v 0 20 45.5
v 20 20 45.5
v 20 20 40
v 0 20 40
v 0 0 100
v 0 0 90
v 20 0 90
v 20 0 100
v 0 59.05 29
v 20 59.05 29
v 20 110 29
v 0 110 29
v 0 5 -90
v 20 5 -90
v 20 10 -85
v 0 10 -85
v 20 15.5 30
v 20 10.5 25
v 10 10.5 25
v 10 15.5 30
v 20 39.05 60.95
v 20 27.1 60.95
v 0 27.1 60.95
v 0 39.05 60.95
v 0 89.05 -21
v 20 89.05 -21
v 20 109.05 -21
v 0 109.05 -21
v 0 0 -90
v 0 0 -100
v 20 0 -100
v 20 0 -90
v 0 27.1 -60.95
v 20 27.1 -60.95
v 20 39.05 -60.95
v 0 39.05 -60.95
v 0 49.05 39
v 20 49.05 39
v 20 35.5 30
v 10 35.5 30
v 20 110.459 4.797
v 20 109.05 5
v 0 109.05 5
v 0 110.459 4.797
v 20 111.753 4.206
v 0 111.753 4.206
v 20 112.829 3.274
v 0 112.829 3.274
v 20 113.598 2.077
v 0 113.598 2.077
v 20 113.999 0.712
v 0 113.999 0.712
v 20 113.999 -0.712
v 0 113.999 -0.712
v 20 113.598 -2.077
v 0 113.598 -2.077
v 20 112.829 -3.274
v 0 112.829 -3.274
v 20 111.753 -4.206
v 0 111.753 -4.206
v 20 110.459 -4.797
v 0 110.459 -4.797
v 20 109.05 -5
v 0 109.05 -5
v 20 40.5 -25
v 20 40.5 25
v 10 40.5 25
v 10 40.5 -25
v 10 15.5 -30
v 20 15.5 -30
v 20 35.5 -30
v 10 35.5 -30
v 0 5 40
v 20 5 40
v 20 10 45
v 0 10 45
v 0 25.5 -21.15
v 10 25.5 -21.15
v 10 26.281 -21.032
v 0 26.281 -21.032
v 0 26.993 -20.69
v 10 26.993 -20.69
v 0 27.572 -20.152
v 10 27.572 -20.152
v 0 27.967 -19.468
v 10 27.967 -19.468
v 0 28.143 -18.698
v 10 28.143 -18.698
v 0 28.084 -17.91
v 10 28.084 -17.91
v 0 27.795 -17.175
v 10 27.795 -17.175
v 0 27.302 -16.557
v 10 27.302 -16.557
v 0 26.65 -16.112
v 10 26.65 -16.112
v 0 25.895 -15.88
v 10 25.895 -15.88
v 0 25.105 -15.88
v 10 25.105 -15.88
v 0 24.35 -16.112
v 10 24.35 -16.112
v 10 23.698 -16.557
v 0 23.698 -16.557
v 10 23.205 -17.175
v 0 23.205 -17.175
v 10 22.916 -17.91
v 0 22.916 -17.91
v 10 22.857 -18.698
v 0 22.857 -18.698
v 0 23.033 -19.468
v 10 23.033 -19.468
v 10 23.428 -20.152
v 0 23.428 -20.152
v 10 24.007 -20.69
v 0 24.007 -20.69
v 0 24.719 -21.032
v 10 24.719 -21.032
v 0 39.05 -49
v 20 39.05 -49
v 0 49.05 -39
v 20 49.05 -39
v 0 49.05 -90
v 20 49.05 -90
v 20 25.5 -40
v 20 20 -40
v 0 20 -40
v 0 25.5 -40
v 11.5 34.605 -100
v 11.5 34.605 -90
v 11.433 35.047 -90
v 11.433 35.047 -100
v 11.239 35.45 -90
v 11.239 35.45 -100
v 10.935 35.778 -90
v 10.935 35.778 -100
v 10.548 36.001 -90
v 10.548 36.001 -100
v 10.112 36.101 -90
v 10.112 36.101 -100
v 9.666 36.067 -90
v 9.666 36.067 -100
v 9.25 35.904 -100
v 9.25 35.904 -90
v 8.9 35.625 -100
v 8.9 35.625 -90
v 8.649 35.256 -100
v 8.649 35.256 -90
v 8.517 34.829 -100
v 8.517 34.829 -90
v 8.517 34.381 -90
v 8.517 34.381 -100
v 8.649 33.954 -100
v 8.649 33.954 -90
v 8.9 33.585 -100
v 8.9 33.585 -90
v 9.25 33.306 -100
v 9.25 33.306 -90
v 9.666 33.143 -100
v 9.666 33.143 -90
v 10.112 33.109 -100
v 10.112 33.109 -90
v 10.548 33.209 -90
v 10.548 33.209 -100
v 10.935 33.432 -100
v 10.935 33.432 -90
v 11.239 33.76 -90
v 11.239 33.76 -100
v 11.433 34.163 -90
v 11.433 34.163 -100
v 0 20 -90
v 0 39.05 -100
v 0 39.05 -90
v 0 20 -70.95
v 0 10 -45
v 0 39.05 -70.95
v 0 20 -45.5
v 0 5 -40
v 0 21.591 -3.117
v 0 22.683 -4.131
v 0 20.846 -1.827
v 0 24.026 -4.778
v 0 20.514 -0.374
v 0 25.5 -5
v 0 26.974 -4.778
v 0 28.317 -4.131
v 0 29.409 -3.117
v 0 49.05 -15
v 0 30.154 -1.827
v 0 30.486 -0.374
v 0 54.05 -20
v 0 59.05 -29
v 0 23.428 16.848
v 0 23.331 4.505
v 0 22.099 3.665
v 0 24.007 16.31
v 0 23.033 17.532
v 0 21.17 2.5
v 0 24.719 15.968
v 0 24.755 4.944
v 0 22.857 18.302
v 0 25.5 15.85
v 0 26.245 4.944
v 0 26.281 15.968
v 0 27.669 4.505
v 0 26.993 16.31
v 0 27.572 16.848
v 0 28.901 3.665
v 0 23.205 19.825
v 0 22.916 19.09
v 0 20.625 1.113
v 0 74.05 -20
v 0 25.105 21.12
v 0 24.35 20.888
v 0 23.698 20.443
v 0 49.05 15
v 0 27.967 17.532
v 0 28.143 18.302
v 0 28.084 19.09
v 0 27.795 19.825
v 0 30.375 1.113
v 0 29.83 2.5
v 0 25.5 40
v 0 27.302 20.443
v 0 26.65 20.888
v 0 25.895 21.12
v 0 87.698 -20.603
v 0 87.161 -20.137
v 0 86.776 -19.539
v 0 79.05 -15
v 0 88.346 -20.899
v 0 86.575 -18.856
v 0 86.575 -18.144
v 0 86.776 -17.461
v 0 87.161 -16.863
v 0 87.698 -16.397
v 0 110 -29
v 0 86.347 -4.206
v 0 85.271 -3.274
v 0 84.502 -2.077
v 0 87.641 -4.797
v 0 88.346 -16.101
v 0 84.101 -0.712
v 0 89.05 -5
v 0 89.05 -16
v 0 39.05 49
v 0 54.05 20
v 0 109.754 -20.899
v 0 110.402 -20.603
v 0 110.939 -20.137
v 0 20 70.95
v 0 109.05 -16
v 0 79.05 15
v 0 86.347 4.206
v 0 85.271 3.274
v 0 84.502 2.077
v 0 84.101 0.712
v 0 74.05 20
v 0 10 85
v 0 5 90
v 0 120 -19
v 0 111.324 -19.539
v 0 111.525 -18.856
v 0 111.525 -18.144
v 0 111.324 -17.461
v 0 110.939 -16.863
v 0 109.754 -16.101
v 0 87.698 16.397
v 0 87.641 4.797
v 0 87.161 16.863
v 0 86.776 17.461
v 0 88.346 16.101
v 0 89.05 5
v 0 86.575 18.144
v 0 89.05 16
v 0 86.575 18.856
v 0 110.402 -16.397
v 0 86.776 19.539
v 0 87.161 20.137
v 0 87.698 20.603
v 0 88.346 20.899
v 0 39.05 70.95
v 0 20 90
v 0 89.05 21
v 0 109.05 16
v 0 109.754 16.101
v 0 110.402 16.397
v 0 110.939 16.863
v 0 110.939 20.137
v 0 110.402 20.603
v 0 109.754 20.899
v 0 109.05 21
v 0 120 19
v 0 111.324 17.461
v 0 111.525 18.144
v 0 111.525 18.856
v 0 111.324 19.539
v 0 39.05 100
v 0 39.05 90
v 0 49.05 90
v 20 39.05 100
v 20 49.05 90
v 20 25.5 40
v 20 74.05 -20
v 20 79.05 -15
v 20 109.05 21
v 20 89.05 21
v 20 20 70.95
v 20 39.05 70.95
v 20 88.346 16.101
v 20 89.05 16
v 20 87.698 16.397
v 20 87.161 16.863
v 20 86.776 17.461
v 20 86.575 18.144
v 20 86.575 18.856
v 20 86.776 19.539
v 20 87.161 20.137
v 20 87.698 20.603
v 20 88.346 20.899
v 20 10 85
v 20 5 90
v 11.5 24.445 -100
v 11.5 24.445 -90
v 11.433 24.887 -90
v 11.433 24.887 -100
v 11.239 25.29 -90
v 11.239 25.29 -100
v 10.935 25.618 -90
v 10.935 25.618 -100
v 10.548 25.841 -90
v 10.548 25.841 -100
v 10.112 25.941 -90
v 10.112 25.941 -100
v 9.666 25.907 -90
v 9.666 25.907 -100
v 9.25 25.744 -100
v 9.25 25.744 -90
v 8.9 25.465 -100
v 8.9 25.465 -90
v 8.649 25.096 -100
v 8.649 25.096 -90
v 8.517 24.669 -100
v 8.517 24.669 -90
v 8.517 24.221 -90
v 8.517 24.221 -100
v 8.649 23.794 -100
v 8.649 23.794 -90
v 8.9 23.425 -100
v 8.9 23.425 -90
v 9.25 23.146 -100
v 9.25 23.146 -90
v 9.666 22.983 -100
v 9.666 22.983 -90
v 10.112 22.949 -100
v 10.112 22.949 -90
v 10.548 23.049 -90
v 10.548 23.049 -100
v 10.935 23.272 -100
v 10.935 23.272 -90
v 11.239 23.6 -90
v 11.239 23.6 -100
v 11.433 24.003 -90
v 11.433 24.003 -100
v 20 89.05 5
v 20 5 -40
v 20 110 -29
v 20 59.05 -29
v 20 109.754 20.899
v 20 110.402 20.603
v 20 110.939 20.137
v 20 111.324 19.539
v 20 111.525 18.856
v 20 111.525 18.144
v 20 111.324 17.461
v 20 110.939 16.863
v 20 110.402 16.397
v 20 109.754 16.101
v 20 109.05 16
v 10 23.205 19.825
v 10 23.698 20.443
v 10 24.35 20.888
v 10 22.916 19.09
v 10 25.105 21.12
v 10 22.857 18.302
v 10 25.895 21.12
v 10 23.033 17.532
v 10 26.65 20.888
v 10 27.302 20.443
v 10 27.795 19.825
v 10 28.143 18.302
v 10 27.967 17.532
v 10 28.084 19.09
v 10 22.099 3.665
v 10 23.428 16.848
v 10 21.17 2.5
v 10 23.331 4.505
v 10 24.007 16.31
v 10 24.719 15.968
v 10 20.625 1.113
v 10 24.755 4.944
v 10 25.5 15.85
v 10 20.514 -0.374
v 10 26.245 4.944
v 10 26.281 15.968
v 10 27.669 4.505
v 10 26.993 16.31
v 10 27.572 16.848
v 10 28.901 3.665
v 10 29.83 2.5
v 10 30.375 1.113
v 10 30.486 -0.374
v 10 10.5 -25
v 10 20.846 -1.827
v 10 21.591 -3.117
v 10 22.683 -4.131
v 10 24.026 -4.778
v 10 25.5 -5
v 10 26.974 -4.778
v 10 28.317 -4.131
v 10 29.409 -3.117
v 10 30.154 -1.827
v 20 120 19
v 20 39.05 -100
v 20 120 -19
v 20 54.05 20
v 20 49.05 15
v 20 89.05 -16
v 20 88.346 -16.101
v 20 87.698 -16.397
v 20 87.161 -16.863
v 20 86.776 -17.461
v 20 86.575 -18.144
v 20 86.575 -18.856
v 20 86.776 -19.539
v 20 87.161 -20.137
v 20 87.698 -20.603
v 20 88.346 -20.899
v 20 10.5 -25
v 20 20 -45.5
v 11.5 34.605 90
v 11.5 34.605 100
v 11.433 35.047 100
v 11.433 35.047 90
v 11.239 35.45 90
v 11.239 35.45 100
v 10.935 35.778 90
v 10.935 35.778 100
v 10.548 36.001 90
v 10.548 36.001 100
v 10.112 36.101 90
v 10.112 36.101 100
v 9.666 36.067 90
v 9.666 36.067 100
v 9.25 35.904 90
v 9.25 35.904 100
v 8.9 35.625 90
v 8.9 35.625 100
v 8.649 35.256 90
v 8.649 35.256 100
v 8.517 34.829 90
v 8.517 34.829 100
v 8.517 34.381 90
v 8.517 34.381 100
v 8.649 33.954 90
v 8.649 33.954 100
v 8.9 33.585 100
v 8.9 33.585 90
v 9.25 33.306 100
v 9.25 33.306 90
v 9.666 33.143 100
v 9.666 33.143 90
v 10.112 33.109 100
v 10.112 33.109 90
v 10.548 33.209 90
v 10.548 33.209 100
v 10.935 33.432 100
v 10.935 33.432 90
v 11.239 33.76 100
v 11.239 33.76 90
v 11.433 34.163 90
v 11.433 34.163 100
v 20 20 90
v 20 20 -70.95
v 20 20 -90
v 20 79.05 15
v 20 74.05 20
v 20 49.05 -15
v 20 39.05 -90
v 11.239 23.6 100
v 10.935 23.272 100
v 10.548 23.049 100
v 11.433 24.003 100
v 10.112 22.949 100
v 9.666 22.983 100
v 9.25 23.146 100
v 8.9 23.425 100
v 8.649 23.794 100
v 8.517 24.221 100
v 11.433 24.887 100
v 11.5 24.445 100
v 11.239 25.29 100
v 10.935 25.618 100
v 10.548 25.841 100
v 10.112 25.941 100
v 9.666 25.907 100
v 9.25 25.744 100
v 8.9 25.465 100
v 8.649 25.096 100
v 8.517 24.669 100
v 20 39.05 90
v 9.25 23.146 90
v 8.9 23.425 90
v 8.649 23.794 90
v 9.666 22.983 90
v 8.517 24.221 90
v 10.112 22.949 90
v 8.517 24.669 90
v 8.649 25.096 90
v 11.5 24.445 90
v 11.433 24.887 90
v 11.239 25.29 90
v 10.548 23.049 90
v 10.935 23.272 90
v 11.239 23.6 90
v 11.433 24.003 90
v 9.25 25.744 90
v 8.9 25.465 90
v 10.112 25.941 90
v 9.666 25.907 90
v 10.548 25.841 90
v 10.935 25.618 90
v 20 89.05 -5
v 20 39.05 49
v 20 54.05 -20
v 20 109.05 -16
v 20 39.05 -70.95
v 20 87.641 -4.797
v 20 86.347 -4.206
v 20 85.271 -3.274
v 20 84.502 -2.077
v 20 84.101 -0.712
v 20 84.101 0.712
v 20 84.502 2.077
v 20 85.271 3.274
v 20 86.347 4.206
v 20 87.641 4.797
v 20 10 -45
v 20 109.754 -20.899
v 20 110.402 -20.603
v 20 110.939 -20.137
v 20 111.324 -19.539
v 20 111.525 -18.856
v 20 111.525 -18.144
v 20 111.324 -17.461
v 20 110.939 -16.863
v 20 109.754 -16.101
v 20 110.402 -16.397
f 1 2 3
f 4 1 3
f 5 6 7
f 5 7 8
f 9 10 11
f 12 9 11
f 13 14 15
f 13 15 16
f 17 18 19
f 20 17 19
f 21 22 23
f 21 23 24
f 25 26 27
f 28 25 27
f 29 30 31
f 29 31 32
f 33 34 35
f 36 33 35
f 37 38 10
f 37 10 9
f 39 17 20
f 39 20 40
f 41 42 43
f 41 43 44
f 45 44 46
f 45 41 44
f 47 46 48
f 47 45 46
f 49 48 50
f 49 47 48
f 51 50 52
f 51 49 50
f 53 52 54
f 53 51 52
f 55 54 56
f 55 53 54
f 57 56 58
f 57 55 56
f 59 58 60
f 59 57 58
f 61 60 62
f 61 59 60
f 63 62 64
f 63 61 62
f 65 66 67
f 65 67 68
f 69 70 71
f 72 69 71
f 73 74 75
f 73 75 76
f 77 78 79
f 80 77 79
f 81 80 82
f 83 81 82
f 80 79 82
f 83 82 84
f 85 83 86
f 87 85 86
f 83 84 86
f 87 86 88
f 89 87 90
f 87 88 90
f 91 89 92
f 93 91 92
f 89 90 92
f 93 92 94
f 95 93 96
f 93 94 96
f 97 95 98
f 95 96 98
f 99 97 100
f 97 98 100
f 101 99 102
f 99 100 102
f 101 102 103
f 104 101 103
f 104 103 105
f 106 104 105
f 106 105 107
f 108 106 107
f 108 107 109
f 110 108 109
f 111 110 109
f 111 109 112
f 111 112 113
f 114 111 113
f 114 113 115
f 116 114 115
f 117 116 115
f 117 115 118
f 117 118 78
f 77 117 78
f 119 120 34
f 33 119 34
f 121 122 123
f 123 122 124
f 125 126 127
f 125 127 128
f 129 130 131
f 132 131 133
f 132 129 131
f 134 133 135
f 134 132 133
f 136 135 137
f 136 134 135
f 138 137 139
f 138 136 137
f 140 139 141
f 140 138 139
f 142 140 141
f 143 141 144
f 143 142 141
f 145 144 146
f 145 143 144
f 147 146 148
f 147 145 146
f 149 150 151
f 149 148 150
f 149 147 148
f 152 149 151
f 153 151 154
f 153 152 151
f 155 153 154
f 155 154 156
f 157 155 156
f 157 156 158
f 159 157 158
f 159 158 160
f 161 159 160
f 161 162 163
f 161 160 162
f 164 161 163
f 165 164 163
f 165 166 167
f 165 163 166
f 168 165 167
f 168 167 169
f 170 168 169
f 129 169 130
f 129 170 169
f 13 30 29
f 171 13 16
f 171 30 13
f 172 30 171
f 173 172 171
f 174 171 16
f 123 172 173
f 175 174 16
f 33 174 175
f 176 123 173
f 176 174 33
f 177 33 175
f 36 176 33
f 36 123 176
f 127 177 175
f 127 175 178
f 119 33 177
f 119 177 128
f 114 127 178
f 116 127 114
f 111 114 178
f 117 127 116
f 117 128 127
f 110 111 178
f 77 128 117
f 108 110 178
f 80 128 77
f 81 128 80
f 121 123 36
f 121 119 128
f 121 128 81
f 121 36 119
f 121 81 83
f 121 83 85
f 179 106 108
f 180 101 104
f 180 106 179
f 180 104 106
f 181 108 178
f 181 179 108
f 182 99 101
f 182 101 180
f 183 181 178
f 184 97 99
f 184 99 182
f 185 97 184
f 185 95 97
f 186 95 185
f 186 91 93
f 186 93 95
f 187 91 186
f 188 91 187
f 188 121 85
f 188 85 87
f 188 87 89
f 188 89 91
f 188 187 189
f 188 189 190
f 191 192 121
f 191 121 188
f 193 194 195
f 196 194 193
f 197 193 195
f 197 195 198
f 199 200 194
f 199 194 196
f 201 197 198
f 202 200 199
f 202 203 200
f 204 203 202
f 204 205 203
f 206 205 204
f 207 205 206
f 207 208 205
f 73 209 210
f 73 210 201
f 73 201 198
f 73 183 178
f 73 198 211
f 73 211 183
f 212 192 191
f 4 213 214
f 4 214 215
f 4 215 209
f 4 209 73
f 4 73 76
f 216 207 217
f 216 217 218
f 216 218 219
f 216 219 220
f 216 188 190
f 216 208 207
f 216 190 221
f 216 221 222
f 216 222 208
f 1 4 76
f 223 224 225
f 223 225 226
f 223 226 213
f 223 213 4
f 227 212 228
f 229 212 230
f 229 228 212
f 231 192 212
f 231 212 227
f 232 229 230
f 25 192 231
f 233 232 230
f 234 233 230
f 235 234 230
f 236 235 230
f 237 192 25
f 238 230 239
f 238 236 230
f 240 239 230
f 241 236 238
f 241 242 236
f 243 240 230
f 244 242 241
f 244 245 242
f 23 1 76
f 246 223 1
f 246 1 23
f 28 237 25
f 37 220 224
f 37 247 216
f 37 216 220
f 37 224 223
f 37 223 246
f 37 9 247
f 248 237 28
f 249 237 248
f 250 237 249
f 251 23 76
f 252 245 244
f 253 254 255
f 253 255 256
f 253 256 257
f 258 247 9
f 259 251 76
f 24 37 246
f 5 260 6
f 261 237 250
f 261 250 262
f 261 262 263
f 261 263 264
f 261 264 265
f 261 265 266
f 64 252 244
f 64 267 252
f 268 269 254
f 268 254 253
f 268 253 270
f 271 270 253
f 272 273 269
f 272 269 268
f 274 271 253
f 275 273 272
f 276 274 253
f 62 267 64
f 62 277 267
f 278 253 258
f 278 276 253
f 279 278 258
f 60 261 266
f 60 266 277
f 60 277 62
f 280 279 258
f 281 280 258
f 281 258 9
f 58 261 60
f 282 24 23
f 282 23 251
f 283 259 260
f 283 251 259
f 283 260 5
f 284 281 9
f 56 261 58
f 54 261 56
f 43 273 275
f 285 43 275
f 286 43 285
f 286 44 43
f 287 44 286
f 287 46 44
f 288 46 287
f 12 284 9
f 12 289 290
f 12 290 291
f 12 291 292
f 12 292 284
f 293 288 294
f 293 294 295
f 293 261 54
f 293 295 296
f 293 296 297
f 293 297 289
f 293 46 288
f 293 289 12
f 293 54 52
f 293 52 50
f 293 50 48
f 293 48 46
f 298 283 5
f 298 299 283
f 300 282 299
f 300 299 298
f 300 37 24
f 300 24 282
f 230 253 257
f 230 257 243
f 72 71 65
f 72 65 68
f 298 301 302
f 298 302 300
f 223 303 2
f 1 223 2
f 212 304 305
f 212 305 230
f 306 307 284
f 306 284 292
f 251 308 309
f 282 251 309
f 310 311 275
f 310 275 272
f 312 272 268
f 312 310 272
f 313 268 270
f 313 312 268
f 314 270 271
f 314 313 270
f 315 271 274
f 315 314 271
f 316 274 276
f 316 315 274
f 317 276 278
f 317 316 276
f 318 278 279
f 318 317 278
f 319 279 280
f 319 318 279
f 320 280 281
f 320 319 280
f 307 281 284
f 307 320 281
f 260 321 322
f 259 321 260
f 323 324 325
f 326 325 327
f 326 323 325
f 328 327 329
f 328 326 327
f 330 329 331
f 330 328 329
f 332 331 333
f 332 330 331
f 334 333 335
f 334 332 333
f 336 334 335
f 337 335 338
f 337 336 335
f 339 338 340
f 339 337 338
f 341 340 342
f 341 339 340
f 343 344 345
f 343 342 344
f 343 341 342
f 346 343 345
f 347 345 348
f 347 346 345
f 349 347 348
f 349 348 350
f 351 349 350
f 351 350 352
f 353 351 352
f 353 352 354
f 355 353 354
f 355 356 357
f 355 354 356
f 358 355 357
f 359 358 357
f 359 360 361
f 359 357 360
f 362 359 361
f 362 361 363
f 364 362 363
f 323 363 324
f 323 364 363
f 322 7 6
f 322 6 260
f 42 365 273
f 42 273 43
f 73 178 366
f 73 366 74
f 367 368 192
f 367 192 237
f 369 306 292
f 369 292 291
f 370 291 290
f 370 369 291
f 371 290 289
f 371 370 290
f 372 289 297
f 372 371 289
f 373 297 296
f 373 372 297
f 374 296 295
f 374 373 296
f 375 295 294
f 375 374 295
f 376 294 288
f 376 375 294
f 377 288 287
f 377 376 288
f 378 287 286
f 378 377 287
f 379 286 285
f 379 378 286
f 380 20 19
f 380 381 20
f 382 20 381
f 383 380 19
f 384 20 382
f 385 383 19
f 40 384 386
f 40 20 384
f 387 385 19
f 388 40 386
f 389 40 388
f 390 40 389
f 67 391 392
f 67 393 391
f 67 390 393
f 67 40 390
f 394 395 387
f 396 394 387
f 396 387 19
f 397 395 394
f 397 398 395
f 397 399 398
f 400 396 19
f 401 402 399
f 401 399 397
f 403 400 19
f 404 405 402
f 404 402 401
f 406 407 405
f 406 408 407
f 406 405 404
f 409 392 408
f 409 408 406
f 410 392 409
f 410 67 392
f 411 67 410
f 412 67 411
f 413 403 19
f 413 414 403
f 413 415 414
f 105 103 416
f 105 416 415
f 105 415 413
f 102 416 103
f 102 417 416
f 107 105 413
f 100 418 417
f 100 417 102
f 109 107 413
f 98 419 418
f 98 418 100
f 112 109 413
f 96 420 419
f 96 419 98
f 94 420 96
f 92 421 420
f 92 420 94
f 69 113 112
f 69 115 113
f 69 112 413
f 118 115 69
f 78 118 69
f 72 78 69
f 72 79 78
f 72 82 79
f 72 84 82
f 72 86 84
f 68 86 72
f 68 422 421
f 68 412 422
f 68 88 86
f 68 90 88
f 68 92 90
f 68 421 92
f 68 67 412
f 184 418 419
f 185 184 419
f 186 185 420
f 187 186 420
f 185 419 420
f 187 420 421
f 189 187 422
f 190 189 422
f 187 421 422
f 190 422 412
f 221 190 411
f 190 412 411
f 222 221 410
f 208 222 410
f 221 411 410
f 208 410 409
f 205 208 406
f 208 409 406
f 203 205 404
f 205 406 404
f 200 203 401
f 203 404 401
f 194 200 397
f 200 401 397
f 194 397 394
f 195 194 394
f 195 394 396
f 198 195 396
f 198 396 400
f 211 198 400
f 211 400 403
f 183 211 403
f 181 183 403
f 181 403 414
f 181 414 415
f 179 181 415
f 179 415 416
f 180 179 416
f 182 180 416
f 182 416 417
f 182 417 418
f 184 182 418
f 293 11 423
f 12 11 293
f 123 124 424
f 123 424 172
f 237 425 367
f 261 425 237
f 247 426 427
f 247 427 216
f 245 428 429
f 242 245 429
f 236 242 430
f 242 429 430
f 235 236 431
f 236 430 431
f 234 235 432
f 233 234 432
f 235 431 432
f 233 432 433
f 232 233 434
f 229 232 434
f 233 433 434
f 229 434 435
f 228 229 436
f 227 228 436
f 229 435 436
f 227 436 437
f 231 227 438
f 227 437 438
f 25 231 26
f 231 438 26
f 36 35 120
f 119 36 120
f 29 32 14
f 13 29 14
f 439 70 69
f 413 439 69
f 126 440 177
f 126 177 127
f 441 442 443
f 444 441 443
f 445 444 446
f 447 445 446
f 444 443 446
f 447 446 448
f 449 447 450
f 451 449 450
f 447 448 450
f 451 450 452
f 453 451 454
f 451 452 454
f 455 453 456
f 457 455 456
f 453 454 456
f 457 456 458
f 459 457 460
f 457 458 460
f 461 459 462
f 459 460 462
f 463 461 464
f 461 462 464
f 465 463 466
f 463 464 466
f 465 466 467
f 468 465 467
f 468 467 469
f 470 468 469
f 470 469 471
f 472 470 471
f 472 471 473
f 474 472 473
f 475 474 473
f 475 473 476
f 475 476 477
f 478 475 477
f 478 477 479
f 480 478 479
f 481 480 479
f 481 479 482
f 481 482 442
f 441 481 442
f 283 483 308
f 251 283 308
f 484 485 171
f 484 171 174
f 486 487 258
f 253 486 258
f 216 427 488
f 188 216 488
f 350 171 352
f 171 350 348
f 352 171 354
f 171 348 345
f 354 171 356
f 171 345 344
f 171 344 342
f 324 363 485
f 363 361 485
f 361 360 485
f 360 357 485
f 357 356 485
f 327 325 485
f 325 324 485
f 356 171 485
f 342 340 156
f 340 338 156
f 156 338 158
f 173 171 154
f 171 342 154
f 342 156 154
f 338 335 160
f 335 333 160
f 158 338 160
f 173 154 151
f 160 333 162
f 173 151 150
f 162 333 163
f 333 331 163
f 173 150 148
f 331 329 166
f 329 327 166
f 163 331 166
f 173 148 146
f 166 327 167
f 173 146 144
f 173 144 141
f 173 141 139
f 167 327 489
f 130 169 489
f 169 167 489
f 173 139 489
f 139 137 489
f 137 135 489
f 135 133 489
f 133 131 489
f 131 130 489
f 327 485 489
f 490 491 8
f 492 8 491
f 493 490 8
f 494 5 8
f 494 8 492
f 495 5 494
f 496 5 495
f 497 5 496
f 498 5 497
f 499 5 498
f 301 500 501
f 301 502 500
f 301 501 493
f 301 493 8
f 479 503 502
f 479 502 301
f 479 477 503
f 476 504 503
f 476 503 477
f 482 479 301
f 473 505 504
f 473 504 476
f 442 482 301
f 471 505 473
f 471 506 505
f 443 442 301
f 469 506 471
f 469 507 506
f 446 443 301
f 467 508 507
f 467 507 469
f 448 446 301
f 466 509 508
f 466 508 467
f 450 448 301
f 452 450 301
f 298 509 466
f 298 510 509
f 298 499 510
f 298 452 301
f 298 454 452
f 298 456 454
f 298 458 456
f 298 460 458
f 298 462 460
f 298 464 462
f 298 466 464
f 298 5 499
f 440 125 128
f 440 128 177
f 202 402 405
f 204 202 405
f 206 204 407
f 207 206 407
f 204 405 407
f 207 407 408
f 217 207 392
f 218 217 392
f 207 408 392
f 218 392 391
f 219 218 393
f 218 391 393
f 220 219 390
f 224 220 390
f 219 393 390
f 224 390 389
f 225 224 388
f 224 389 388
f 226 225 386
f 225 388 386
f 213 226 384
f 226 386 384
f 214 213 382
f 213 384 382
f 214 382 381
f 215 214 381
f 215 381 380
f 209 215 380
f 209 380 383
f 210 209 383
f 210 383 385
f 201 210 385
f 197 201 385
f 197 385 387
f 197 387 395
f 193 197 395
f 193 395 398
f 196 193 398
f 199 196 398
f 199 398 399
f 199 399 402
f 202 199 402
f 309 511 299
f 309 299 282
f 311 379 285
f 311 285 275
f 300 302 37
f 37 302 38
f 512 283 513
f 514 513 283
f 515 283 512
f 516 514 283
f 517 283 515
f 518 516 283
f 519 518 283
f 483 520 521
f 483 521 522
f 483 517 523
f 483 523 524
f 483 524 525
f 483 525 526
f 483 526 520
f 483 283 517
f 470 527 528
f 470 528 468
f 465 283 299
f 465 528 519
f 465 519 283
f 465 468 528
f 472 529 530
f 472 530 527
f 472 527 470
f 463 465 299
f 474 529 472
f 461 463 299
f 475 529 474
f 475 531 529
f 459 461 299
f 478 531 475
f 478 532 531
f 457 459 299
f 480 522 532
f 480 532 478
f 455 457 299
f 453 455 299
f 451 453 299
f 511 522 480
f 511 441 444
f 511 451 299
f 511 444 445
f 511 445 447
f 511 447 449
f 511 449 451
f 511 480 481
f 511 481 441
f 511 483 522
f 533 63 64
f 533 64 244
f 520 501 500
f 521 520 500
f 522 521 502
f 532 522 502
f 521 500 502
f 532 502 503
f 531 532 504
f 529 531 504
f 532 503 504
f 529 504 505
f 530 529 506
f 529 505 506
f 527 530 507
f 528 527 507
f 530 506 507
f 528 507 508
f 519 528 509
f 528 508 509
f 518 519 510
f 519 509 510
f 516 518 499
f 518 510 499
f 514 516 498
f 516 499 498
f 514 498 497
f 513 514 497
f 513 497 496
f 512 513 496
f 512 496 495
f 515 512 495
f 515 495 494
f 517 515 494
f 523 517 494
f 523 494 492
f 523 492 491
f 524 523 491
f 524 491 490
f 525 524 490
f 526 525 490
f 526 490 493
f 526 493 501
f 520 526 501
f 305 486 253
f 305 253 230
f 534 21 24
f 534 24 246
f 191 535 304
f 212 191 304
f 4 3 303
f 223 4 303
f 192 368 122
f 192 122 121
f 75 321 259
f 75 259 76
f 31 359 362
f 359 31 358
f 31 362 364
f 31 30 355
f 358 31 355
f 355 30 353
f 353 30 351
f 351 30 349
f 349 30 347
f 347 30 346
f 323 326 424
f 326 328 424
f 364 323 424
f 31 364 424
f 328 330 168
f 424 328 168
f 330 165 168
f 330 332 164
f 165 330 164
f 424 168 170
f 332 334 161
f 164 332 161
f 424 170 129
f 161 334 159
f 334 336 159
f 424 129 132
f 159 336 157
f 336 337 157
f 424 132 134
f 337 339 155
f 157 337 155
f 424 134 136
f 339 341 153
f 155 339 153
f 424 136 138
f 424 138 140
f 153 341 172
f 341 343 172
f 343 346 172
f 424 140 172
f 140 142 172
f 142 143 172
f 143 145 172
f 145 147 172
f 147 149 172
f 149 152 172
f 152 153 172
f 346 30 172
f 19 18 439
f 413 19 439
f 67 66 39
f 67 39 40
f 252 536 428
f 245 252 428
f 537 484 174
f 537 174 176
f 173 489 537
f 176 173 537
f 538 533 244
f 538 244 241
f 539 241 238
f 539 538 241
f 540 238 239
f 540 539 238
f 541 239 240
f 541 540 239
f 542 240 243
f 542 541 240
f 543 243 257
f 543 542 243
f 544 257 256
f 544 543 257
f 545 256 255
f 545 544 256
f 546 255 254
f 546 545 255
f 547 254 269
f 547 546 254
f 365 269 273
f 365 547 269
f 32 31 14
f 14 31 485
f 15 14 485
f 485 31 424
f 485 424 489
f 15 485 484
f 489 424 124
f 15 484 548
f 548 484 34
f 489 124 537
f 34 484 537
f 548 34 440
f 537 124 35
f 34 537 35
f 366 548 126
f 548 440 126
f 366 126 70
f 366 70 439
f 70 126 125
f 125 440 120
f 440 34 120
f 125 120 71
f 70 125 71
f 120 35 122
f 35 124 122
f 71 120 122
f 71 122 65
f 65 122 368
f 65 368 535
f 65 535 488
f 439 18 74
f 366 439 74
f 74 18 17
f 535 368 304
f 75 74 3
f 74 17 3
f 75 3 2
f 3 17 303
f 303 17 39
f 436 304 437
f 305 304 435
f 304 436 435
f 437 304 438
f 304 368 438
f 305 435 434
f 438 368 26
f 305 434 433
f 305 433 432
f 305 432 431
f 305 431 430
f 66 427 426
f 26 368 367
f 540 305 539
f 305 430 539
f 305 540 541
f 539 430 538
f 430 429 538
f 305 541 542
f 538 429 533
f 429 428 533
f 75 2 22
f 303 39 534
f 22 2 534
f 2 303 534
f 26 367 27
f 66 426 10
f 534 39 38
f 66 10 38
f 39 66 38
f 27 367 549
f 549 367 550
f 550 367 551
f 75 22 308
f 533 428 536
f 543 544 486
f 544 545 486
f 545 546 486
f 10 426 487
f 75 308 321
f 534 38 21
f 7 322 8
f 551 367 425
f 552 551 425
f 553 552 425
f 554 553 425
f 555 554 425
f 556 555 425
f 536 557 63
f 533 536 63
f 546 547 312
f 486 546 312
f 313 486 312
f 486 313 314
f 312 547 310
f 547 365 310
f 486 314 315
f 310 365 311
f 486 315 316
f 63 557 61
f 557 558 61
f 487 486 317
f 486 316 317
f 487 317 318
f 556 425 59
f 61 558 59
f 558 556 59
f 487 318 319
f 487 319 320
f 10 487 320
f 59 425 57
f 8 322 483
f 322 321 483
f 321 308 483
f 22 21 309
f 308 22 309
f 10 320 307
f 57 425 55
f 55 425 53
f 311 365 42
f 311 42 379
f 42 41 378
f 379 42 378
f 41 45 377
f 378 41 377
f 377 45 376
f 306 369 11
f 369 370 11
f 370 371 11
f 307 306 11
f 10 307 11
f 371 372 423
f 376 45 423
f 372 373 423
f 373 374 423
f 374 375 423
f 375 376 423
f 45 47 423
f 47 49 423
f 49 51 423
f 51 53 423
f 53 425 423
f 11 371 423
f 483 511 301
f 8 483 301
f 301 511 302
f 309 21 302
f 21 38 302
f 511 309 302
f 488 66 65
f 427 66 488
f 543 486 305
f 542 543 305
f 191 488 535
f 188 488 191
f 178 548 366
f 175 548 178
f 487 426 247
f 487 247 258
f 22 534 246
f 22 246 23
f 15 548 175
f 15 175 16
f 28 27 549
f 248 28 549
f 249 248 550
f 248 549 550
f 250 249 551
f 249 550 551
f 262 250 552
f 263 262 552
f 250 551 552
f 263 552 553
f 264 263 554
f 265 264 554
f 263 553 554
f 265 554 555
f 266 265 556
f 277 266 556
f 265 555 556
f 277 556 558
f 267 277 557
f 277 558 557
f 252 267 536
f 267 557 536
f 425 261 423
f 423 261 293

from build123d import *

# Parameters (mm, degrees)
SKETCH1_W           = 100
SKETCH1_H           = 120
BOSS_EXTRUDE1_DEPTH = 20
SKETCH2_W           = 19.05
SKETCH2_H           = 19.05
CUT_EXTRUDE1_DEPTH  = 20
SKETCH3_R           = 1.5
CUT_EXTRUDE2_DEPTH  = 20
SKETCH5_R           = 5
SKETCH5_R_2         = 2.65
CUT_EXTRUDE3_DEPTH  = 21
SKETCH6_W           = 60
SKETCH6_H           = 30
CUT_EXTRUDE4_DEPTH  = 10
CUT_EXTRUDE5_DEPTH  = 21
SKETCH8_W           = 71
SKETCH8_H           = 70.95
CUT_EXTRUDE6_DEPTH  = 21
CHAMFER1_SIZE       = 10
SKETCH9_W           = 50
SKETCH9_H           = 10
SKETCH9_W_2         = 40
SKETCH9_H_2         = 30
CUT_EXTRUDE7_DEPTH  = 21
CHAMFER2_SIZE       = 5
CUT_EXTRUDE8_DEPTH  = 21
SKETCH12_W          = 80
SKETCH12_H          = 5
CUT_EXTRUDE9_DEPTH  = 21


with BuildPart() as part:
    # Sketch1 → Boss-Extrude1 (new body)
    with BuildSketch(Plane(origin=(0, 0, 0), x_dir=(0, 0, -1), z_dir=(1, 0, 0))):
        with Locations((-50, 60)):
            Rectangle(SKETCH1_W, SKETCH1_H)
    boss_extrude1 = extrude(amount=BOSS_EXTRUDE1_DEPTH)

    # Sketch2 → Cut-Extrude1 (cut)
    with BuildSketch(Plane(origin=(20, 0, 0), x_dir=(0, 0, -1), z_dir=(1, 0, 0))):
        with Locations((-80.475, 29.525)):
            Rectangle(SKETCH2_W, SKETCH2_H)
    cut_extrude1 = extrude(amount=-CUT_EXTRUDE1_DEPTH, mode=Mode.SUBTRACT)

    # Sketch3 → Cut-Extrude2 (cut)
    with BuildSketch(Plane.XY.offset(100)):
        with Locations((10, 34.605)):
            Circle(SKETCH3_R)
        with Locations((10, 24.445)):
            Circle(SKETCH3_R)
    cut_extrude2 = extrude(amount=-CUT_EXTRUDE2_DEPTH, mode=Mode.SUBTRACT)

    # Mirror1: Boss-Extrude1, Cut-Extrude1, Cut-Extrude2 across plane
    add(boss_extrude1.mirror(Plane(origin=(20, 0, 0), x_dir=(1, 0, 0), z_dir=(0, 0, 1))))
    add(cut_extrude1.mirror(Plane(origin=(20, 0, 0), x_dir=(1, 0, 0), z_dir=(0, 0, 1))), mode=Mode.SUBTRACT)
    add(cut_extrude2.mirror(Plane(origin=(20, 0, 0), x_dir=(1, 0, 0), z_dir=(0, 0, 1))), mode=Mode.SUBTRACT)

    # Sketch5 → Cut-Extrude3 (cut, through all)
    with BuildSketch(Plane(origin=(20, 0, 0), x_dir=(0, 0, -1), z_dir=(1, 0, 0))):
        with Locations((0, 25.5)):
            Circle(SKETCH5_R)
        with Locations((-18.5, 25.5)):
            Circle(SKETCH5_R_2)
        with Locations((18.5, 25.5)):
            Circle(SKETCH5_R_2)
    extrude(amount=-CUT_EXTRUDE3_DEPTH, mode=Mode.SUBTRACT)

    # Sketch6 → Cut-Extrude4 (cut)
    with BuildSketch(Plane(origin=(20, 0, 0), x_dir=(0, 0, -1), z_dir=(1, 0, 0))):
        with Locations((0, 25.5)):
            Rectangle(SKETCH6_W, SKETCH6_H)
    extrude(amount=-CUT_EXTRUDE4_DEPTH, mode=Mode.SUBTRACT)

    # Sketch7 → Cut-Extrude5 (cut, through all)
    with BuildSketch(Plane(origin=(20, 0, 0), x_dir=(0, 0, -1), z_dir=(1, 0, 0))):
        with BuildLine():
            Line((5, 109.05), (5, 89.05))
            ThreePointArc((5, 89.05), (0, 84.05), (-5, 89.05))
            Line((-5, 89.05), (-5, 109.05))
            ThreePointArc((-5, 109.05), (0, 114.05), (5, 109.05))
        make_face()
        with BuildLine():
            Line((-16, 109.05), (-16, 89.05))
            ThreePointArc((-16, 89.05), (-18.5, 86.55), (-21, 89.05))
            Line((-21, 89.05), (-21, 109.05))
            ThreePointArc((-21, 109.05), (-18.5, 111.55), (-16, 109.05))
        make_face()
        with BuildLine():
            Line((16, 109.05), (16, 89.05))
            ThreePointArc((16, 89.05), (18.5, 86.55), (21, 89.05))
            Line((21, 89.05), (21, 109.05))
            ThreePointArc((21, 109.05), (18.5, 111.55), (16, 109.05))
        make_face()
    extrude(amount=-CUT_EXTRUDE5_DEPTH, mode=Mode.SUBTRACT)

    # Sketch8 → Cut-Extrude6 (cut, through all)
    with BuildSketch(Plane(origin=(20, 0, 0), x_dir=(0, 0, -1), z_dir=(1, 0, 0))):
        with Locations((-64.5, 84.525)):
            Rectangle(SKETCH8_W, SKETCH8_H)
        with Locations((64.5, 84.525)):
            Rectangle(SKETCH8_W, SKETCH8_H)
    extrude(amount=-CUT_EXTRUDE6_DEPTH, mode=Mode.SUBTRACT)

    # Chamfer1
    chamfer1_edges = [part.edges().sort_by_distance(p)[0] for p in [
        (10, 49.05, 100),
        (10, 120, 29),
        (10, 49.05, 29),
        (10, 120, -29),
        (10, 49.05, -100),
        (10, 49.05, -29),
    ]]
    chamfer(chamfer1_edges, length=CHAMFER1_SIZE)

    # Sketch9 → Cut-Extrude7 (cut, through all)
    with BuildSketch(Plane(origin=(20, 0, 0), x_dir=(0, 0, -1), z_dir=(1, 0, 0))):
        with Locations((-65, 5)):
            Rectangle(SKETCH9_W, SKETCH9_H)
        with Locations((65, 5)):
            Rectangle(SKETCH9_W, SKETCH9_H)
        with Locations((0, 64.05)):
            Rectangle(SKETCH9_W_2, SKETCH9_H_2)
    extrude(amount=-CUT_EXTRUDE7_DEPTH, mode=Mode.SUBTRACT)

    # Chamfer2
    chamfer2_edges = [part.edges().sort_by_distance(p)[0] for p in [
        (10, 10, 90),
        (10, 10, 40),
        (10, 10, -40),
        (10, 10, -90),
        (10, 49.05, 20),
        (10, 79.05, 20),
        (10, 79.05, -20),
        (10, 49.05, -20),
        (15, 10.5, 30),
        (15, 40.5, 30),
        (15, 40.5, -30),
        (15, 10.5, -30),
    ]]
    chamfer(chamfer2_edges, length=CHAMFER2_SIZE)

    # Sketch11 → Cut-Extrude8 (cut, through all)
    with BuildSketch(Plane(origin=(20, 0, 0), x_dir=(0, 0, -1), z_dir=(1, 0, 0))):
        Polygon((-40, 25.5), (-45.5, 20), (-40, 20), align=None)
        Polygon((-49, 39.05), (-60.95, 27.1), (-60.95, 39.05), align=None)
    cut_extrude8 = extrude(amount=-CUT_EXTRUDE8_DEPTH, mode=Mode.SUBTRACT)

    # Mirror2: Cut-Extrude8 across plane
    add(cut_extrude8.mirror(Plane.XY), mode=Mode.SUBTRACT)

    # Sketch12 → Cut-Extrude9 (cut, through all)
    with BuildSketch(Plane.ZY):
        with Locations((0, 2.5)):
            Rectangle(SKETCH12_W, SKETCH12_H)
    extrude(amount=-CUT_EXTRUDE9_DEPTH, mode=Mode.SUBTRACT)


solid = part.part
